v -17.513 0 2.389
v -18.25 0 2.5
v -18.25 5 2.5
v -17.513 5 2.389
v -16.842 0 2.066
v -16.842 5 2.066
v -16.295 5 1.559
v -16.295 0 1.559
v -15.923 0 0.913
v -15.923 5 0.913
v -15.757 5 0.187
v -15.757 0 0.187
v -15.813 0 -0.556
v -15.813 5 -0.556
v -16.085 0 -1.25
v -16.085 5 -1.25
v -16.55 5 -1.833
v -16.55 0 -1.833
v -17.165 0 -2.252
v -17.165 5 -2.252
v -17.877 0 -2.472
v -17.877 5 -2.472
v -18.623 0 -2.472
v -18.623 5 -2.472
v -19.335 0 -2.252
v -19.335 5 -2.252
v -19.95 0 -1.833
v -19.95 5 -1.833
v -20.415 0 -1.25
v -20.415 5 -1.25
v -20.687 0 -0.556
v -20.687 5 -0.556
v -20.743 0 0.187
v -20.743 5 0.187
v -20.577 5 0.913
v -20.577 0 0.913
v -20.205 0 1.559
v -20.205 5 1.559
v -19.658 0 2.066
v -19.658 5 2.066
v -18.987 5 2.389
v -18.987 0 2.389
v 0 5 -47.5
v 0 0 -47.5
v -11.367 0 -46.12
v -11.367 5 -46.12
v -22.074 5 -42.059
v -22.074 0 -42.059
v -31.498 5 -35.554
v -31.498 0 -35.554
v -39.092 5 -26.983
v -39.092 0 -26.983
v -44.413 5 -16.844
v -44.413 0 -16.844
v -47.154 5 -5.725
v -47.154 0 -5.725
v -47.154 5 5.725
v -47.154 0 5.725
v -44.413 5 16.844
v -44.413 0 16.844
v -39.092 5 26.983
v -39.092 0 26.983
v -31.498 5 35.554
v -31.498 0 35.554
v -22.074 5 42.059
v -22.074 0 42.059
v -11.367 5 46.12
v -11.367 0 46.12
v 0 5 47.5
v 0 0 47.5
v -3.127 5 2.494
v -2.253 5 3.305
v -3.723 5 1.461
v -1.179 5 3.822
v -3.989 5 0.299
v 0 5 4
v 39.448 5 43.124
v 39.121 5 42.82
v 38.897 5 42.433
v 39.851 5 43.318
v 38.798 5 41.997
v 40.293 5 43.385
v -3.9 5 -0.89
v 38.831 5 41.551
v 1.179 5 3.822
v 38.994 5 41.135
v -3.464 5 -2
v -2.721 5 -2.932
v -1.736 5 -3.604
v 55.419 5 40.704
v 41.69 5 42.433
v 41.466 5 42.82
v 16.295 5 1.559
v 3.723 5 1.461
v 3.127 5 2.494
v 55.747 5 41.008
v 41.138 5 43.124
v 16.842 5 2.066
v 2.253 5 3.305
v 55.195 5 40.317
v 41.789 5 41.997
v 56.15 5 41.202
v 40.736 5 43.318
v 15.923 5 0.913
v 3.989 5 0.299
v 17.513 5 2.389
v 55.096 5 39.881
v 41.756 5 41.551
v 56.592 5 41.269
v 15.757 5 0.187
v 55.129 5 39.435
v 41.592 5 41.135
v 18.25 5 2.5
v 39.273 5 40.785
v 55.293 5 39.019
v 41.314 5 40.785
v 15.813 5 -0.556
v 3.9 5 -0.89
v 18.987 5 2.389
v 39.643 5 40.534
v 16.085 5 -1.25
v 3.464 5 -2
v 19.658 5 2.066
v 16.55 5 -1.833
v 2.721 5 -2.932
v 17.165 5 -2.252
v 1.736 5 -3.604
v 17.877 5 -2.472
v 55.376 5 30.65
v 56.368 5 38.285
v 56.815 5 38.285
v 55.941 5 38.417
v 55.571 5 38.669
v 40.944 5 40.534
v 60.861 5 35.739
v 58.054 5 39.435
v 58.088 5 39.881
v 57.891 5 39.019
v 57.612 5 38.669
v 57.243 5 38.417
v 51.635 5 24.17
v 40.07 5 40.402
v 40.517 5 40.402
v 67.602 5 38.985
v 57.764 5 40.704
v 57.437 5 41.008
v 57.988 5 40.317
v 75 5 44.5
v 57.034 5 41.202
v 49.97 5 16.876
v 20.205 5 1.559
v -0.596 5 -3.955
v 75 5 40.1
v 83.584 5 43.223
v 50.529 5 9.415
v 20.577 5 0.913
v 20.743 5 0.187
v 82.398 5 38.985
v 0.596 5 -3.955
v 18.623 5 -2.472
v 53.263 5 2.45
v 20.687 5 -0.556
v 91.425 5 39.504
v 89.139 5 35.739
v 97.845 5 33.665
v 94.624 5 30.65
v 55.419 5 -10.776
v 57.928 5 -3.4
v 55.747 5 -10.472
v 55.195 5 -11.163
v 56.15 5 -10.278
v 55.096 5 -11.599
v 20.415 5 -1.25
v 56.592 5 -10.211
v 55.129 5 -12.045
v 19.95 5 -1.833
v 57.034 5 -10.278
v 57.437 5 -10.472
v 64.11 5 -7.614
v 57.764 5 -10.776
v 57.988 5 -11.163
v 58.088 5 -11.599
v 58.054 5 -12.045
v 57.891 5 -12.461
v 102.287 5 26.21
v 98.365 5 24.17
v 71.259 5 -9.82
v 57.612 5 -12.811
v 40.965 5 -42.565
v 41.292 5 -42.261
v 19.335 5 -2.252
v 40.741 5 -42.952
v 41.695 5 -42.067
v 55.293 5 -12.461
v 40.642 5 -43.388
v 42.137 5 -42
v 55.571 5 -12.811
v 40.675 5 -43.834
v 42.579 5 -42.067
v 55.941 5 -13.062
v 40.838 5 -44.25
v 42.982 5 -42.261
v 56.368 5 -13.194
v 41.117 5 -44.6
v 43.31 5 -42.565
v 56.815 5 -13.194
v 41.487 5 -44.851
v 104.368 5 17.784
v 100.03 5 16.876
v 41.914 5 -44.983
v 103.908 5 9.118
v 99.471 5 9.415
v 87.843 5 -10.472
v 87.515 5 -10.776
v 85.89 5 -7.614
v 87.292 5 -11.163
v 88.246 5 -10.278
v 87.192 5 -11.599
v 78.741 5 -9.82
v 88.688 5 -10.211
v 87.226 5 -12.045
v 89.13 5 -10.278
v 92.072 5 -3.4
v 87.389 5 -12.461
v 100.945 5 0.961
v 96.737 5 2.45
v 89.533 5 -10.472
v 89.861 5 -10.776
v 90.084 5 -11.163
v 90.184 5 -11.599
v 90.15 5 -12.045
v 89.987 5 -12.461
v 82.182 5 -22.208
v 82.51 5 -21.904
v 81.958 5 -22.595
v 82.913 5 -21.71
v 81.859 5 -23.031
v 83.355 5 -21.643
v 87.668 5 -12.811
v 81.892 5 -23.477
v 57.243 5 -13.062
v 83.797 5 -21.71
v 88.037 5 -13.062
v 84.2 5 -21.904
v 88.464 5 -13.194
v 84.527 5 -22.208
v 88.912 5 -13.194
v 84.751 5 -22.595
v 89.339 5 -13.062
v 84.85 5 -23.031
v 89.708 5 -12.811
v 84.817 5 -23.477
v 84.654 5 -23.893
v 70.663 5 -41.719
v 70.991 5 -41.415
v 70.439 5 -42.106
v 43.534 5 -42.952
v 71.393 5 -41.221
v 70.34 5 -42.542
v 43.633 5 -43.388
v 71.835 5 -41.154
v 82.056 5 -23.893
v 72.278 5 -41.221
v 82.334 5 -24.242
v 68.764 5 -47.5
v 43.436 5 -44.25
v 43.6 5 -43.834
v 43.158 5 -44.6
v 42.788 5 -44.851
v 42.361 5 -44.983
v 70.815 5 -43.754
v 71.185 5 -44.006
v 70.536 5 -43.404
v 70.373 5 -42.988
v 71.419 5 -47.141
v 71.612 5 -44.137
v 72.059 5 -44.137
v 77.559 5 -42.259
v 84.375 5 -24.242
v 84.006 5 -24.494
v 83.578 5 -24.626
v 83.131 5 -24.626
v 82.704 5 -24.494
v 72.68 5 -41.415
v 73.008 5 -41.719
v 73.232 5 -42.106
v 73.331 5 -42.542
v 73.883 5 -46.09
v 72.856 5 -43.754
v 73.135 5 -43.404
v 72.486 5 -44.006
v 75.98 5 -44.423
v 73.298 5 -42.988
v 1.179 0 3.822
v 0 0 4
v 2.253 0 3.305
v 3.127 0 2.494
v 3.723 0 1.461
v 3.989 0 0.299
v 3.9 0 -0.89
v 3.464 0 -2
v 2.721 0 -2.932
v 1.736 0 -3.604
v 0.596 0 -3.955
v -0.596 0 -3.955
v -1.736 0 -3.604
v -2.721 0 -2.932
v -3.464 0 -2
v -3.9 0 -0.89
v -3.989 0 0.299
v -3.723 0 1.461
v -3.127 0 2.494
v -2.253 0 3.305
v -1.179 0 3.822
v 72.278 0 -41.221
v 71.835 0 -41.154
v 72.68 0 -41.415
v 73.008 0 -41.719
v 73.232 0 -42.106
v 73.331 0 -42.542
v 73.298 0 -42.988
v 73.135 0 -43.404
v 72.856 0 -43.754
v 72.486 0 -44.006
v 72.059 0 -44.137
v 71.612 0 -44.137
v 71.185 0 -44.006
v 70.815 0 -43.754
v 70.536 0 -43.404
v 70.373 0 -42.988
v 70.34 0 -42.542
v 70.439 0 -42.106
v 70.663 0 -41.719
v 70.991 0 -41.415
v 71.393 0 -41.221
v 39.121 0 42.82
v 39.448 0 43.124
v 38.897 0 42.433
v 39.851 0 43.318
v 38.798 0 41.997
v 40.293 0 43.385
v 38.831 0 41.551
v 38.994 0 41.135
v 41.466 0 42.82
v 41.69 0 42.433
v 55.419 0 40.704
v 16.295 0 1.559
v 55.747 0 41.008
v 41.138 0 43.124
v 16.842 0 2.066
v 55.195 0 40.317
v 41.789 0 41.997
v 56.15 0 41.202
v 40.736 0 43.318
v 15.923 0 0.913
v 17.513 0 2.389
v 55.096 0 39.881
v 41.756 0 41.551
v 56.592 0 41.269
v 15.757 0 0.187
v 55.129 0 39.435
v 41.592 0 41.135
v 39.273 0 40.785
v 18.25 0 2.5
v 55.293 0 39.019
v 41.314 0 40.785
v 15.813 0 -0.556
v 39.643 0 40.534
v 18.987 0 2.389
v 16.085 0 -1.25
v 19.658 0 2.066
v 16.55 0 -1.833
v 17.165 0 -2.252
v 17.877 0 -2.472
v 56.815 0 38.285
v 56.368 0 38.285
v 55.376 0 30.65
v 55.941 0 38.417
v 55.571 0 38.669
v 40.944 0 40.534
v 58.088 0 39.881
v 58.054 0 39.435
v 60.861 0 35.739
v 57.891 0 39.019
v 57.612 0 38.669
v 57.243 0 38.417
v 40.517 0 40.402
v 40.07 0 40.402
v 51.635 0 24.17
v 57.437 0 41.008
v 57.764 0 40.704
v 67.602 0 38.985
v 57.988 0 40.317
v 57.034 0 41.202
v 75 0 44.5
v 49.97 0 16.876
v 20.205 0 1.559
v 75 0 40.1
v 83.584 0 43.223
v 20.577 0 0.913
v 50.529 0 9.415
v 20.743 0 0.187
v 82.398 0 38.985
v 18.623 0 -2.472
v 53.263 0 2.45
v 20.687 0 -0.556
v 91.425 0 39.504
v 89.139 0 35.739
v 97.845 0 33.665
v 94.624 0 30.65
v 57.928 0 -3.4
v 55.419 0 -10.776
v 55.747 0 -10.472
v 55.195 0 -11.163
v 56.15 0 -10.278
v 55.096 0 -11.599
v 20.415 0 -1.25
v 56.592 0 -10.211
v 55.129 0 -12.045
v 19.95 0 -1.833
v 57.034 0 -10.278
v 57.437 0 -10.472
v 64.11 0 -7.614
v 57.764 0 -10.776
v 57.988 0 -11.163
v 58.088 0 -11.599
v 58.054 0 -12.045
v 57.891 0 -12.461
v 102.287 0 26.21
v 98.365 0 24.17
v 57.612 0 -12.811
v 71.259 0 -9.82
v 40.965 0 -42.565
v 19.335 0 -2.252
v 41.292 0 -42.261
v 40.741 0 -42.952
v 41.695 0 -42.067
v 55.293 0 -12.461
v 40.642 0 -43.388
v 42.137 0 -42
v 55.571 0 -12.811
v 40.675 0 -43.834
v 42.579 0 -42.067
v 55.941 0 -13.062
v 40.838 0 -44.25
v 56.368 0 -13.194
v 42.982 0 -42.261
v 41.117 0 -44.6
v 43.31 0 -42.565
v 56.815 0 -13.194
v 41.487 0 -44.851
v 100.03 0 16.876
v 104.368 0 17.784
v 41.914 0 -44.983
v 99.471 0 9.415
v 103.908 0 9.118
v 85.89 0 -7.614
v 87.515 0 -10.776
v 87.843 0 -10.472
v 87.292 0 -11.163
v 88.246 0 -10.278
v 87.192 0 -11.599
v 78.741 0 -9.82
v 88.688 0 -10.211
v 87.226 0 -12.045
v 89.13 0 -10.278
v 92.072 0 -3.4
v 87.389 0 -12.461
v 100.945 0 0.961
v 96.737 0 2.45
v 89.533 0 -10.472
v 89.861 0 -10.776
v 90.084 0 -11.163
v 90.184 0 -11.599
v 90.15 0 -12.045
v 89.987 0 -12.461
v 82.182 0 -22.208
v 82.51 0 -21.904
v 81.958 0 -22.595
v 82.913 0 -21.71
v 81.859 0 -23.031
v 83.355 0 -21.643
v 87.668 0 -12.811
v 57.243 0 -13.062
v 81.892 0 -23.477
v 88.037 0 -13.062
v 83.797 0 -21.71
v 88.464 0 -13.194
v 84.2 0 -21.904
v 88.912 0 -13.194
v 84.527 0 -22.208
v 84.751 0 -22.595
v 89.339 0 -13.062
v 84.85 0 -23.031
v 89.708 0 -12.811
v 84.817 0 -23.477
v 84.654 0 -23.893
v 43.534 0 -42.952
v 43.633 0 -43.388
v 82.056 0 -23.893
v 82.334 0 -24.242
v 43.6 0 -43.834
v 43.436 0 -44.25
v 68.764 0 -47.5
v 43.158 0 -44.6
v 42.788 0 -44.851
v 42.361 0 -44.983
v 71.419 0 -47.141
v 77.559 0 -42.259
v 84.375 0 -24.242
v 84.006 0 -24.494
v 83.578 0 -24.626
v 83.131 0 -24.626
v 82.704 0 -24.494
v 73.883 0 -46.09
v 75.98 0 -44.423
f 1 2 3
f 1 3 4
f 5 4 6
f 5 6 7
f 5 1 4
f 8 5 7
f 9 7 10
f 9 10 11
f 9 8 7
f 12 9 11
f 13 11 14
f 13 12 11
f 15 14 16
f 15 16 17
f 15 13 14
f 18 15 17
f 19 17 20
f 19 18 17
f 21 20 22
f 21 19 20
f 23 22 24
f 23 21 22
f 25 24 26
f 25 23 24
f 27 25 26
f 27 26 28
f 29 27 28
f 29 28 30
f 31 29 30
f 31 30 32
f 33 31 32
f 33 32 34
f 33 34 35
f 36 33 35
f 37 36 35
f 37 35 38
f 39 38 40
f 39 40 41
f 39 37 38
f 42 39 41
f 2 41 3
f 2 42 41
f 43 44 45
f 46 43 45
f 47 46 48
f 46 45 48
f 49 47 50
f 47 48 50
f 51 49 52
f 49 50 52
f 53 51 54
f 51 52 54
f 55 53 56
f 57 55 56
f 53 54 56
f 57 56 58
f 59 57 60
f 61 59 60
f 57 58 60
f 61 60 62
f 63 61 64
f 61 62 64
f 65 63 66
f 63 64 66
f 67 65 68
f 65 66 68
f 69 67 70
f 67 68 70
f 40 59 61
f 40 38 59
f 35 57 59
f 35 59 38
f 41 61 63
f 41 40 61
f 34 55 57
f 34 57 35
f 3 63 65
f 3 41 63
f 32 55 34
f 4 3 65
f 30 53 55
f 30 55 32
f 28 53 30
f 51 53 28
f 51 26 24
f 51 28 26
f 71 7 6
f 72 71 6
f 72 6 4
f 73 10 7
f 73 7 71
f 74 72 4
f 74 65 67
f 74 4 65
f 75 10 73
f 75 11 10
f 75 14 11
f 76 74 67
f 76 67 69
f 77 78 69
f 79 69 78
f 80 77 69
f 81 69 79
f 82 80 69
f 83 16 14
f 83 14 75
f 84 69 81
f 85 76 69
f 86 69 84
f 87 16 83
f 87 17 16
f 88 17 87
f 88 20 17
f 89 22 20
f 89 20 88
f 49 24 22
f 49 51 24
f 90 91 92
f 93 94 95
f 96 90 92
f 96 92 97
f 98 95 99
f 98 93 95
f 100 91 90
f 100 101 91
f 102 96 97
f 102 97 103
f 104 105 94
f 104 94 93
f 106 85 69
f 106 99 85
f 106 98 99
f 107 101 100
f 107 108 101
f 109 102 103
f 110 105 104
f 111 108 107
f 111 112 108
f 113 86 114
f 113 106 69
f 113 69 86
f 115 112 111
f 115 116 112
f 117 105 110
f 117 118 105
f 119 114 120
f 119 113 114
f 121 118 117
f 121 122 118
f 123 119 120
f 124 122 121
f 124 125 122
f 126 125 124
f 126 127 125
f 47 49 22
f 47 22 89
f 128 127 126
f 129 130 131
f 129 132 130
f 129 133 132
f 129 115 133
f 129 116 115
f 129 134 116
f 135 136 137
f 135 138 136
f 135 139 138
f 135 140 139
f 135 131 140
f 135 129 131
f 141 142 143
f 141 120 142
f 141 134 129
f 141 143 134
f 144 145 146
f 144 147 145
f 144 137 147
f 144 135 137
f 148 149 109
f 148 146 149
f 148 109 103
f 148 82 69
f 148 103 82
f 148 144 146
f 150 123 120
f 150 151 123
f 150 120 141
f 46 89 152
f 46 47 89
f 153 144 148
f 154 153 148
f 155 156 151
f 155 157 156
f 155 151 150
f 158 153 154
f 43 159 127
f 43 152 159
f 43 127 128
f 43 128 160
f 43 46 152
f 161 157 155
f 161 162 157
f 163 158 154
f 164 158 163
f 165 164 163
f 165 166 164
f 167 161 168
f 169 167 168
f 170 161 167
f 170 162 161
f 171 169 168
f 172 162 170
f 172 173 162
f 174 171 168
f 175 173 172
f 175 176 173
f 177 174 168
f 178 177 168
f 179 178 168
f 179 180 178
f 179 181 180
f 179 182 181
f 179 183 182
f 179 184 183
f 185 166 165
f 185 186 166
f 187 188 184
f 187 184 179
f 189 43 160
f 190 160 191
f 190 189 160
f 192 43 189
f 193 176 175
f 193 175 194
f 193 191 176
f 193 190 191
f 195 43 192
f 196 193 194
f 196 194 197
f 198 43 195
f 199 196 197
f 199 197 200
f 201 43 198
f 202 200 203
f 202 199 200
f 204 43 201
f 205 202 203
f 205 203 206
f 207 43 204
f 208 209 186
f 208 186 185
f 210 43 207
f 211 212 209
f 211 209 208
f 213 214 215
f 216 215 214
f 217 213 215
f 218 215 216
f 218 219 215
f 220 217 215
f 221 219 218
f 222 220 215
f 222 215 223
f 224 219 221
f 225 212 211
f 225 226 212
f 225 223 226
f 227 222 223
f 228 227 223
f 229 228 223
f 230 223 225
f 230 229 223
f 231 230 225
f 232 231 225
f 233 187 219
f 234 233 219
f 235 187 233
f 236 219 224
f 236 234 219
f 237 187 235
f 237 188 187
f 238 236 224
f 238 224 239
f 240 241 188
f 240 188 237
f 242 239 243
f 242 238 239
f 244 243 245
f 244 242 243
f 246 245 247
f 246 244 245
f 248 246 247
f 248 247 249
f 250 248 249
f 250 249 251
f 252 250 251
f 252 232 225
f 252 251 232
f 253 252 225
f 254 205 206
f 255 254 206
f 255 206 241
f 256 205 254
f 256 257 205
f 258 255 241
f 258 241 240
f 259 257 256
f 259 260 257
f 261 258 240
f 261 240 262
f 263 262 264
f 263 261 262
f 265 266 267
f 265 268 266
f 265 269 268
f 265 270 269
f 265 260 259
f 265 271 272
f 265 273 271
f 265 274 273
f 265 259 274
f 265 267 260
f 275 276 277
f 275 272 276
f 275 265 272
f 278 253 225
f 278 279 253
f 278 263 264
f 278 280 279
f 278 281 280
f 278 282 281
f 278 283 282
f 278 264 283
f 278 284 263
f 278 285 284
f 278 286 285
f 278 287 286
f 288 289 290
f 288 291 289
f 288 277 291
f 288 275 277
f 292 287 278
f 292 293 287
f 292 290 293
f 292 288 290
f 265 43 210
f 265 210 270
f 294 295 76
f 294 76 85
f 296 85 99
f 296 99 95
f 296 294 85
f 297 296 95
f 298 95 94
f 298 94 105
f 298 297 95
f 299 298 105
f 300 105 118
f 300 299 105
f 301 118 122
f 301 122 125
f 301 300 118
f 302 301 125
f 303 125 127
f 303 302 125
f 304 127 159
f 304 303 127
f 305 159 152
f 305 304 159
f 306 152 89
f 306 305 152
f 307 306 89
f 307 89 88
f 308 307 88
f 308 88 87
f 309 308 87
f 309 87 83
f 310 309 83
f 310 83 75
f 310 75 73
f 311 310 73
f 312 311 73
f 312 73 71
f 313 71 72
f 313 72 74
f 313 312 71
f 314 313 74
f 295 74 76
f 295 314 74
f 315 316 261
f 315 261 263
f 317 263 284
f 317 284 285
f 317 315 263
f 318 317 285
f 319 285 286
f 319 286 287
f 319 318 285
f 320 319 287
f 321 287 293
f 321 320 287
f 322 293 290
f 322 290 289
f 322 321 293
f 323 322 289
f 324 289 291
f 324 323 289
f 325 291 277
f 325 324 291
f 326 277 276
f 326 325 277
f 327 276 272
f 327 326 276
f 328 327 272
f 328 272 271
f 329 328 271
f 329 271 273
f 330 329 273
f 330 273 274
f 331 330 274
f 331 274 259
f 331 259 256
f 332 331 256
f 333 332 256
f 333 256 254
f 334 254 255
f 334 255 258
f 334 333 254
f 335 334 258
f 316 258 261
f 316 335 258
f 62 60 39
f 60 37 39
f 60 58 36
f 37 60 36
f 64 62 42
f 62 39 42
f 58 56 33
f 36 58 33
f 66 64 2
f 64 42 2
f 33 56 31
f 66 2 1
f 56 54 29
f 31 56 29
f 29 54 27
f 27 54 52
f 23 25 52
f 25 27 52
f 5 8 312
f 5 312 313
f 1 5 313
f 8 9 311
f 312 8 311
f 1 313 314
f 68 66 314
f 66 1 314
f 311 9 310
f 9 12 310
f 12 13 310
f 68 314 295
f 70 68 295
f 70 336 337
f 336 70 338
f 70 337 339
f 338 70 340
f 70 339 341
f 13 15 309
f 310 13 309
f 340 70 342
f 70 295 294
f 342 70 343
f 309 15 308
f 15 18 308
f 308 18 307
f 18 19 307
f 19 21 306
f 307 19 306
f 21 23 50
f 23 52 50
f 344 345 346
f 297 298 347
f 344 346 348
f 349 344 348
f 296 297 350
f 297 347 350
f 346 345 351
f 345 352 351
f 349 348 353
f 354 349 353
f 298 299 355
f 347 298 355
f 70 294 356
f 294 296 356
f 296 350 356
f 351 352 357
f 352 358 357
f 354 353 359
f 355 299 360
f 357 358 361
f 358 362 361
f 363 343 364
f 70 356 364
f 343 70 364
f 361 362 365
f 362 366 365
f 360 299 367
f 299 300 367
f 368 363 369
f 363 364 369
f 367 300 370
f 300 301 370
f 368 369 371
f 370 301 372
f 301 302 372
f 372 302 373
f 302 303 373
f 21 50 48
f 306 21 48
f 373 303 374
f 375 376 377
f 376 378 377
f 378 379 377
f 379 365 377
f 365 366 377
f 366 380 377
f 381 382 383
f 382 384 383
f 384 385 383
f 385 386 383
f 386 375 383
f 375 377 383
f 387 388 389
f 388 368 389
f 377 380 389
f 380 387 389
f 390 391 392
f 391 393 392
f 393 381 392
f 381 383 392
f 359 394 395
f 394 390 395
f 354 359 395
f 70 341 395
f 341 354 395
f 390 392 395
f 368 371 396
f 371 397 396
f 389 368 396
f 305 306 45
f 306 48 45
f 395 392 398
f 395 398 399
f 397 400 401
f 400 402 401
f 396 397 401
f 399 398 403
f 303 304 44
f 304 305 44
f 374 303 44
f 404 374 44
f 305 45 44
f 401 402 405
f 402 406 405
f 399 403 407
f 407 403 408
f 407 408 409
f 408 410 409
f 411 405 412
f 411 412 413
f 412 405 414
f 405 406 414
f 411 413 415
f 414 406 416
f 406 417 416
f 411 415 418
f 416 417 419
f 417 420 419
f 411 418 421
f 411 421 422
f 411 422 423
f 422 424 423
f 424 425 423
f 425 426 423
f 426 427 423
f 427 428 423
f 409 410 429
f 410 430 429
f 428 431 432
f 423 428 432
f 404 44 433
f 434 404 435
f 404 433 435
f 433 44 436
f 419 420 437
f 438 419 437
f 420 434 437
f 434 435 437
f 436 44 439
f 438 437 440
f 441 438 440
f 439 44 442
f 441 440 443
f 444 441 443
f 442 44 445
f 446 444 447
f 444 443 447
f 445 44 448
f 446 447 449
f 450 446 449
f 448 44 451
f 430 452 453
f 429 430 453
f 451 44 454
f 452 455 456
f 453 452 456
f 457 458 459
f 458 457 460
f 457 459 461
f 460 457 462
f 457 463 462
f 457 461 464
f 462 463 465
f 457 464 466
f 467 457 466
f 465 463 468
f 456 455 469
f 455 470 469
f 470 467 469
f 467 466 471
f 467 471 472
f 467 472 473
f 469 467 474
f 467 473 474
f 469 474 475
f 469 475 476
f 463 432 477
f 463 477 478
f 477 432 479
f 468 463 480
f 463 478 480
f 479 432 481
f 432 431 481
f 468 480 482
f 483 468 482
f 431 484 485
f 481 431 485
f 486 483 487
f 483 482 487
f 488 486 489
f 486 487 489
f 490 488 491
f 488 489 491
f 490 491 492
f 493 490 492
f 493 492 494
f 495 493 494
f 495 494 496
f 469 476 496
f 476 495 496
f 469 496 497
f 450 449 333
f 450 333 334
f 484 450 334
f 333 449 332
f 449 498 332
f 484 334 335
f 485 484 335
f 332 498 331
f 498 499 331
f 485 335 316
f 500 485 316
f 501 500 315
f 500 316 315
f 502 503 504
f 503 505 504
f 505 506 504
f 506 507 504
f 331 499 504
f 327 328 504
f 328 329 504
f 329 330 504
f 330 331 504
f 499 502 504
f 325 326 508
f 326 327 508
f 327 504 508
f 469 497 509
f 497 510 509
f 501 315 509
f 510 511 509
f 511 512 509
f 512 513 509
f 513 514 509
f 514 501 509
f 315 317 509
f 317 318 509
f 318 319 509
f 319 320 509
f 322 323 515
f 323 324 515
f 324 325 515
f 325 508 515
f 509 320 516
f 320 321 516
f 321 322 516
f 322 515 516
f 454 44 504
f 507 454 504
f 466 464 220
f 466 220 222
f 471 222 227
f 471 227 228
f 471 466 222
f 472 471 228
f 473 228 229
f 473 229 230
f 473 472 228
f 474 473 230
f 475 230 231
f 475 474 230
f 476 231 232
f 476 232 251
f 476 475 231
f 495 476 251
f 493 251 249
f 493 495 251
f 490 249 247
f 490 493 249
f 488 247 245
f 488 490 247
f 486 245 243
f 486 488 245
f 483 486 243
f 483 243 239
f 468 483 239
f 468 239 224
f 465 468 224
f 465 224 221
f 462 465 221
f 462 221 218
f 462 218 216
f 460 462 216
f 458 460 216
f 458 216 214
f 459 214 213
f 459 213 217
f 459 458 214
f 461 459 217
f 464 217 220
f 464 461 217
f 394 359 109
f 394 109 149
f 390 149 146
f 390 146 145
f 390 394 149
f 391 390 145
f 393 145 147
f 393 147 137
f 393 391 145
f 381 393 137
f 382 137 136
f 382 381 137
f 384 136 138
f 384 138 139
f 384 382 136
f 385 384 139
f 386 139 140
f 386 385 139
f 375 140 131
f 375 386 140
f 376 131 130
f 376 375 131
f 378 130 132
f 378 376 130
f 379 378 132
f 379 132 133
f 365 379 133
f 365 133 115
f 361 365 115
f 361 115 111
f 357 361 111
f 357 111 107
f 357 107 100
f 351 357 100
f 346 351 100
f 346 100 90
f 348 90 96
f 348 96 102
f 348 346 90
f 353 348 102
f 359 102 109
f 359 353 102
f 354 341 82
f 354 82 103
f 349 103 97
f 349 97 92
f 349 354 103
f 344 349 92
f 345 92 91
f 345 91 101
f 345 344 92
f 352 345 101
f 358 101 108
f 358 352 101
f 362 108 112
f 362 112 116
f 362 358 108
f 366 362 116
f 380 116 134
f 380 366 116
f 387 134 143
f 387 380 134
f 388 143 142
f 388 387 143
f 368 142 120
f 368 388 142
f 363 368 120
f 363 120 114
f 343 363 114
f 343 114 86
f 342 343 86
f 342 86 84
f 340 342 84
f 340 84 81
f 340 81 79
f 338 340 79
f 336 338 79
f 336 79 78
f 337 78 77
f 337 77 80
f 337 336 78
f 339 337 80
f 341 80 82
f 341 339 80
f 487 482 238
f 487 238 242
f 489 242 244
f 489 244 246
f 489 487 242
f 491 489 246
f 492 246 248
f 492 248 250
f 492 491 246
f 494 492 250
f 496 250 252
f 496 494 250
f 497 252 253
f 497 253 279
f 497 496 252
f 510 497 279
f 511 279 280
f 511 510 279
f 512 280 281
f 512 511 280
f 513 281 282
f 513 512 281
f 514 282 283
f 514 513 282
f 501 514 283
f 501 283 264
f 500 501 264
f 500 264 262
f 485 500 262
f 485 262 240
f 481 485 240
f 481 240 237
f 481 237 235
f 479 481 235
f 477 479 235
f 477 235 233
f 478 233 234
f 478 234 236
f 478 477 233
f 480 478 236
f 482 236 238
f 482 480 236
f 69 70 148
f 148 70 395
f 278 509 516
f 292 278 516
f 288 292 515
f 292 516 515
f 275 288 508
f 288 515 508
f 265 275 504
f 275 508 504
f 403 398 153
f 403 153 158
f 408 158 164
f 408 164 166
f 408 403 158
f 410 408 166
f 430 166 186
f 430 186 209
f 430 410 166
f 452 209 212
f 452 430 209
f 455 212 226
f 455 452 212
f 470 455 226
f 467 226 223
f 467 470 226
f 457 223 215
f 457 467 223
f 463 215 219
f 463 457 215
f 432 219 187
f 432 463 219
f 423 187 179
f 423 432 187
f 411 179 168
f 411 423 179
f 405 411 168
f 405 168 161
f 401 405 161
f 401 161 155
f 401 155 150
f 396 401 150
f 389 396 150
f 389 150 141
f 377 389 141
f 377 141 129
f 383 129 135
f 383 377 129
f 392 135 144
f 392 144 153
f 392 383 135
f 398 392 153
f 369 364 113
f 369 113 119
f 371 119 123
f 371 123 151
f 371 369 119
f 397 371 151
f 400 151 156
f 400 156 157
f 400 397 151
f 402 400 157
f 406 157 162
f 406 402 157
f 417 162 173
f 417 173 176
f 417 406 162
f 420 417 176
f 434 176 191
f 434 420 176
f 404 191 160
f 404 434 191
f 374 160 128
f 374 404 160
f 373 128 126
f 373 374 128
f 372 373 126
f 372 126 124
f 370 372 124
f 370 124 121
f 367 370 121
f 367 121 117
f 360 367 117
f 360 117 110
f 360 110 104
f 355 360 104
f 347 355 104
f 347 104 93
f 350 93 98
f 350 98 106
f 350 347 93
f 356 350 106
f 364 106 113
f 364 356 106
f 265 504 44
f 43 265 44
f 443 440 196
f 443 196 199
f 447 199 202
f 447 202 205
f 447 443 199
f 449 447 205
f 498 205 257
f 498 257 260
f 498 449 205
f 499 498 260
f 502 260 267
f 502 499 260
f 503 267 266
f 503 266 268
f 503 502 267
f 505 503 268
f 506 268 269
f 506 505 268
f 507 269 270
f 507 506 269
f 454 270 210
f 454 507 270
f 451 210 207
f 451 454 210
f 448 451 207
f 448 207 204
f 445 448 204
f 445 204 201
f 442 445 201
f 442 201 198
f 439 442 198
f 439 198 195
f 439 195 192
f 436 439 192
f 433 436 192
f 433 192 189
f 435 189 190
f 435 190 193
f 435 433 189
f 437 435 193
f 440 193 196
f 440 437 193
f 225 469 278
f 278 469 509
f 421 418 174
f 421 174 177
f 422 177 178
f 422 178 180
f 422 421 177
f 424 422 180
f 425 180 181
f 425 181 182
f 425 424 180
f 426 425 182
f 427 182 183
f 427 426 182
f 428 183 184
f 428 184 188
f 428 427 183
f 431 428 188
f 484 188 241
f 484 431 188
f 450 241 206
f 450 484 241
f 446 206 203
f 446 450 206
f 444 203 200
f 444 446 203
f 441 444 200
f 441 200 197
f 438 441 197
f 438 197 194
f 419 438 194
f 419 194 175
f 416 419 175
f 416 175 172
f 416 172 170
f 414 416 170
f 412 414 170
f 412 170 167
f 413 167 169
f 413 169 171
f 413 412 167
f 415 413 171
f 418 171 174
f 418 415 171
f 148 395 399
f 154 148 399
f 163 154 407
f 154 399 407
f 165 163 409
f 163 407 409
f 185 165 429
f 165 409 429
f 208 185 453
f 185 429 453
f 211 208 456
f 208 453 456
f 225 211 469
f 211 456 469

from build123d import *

# Parameters (mm, degrees)
SKETCH1_R           = 25.1
SKETCH1_R_2         = 4
SKETCH1_R_3         = 1.5
SKETCH1_R_4         = 2.5
BOSS_EXTRUDE1_DEPTH = 5


with BuildPart() as part:
    # Sketch1 → Boss-Extrude1 (new body)
    with BuildSketch(Plane(origin=(0, 0, 0), x_dir=(1, 0, 0), z_dir=(0, 1, 0))):
        with BuildLine():
            Line((0, -47.5), (75, -44.5))
            ThreePointArc((75, -44.5), (100.341650726, -30.101348895), (100.945295539, -0.961067014))
            Line((100.945295539, -0.961067014), (77.559049402, 42.258960334))
            ThreePointArc((77.559049402, 42.258960334), (73.883135286, 46.090390077), (68.764033965, 47.5))
            Line((68.764033965, 47.5), (0, 47.5))
            ThreePointArc((0, 47.5), (-47.5, 0), (0, -47.5))
        make_face()
        with Locations(Location((75, -15, 0), (0, 0, 270))):
            Circle(SKETCH1_R, mode=Mode.SUBTRACT)
        with Locations(Location((0, 0, 0), (0, 0, 270))):
            Circle(SKETCH1_R_2, mode=Mode.SUBTRACT)
        with Locations(Location((88.688017257, 11.71100727, 0), (0, 0, 270))):
            Circle(SKETCH1_R_3, mode=Mode.SUBTRACT)
        with Locations(Location((56.591696316, 11.71100727, 0), (0, 0, 270))):
            Circle(SKETCH1_R_3, mode=Mode.SUBTRACT)
        with Locations(Location((56.591696316, -39.768646015, 0), (0, 0, 270))):
            Circle(SKETCH1_R_3, mode=Mode.SUBTRACT)
        with Locations(Location((18.25, 0, 0), (0, 0, 270))):
            Circle(SKETCH1_R_4, mode=Mode.SUBTRACT)
        with Locations(Location((-18.25, 0, 0), (0, 0, 270))):
            Circle(SKETCH1_R_4, mode=Mode.SUBTRACT)
        with Locations(Location((71.835494757, 42.654234046, 0), (0, 0, 270))):
            Circle(SKETCH1_R_3, mode=Mode.SUBTRACT)
        with Locations(Location((42.137334928, 43.5, 0), (0, 0, 270))):
            Circle(SKETCH1_R_3, mode=Mode.SUBTRACT)
        with Locations(Location((83.354686129, 23.142870245, 0), (0, 0, 270))):
            Circle(SKETCH1_R_3, mode=Mode.SUBTRACT)
        with Locations(Location((40.293422434, -41.885064382, 0), (0, 0, 270))):
            Circle(SKETCH1_R_3, mode=Mode.SUBTRACT)
    extrude(amount=BOSS_EXTRUDE1_DEPTH)


solid = part.part
